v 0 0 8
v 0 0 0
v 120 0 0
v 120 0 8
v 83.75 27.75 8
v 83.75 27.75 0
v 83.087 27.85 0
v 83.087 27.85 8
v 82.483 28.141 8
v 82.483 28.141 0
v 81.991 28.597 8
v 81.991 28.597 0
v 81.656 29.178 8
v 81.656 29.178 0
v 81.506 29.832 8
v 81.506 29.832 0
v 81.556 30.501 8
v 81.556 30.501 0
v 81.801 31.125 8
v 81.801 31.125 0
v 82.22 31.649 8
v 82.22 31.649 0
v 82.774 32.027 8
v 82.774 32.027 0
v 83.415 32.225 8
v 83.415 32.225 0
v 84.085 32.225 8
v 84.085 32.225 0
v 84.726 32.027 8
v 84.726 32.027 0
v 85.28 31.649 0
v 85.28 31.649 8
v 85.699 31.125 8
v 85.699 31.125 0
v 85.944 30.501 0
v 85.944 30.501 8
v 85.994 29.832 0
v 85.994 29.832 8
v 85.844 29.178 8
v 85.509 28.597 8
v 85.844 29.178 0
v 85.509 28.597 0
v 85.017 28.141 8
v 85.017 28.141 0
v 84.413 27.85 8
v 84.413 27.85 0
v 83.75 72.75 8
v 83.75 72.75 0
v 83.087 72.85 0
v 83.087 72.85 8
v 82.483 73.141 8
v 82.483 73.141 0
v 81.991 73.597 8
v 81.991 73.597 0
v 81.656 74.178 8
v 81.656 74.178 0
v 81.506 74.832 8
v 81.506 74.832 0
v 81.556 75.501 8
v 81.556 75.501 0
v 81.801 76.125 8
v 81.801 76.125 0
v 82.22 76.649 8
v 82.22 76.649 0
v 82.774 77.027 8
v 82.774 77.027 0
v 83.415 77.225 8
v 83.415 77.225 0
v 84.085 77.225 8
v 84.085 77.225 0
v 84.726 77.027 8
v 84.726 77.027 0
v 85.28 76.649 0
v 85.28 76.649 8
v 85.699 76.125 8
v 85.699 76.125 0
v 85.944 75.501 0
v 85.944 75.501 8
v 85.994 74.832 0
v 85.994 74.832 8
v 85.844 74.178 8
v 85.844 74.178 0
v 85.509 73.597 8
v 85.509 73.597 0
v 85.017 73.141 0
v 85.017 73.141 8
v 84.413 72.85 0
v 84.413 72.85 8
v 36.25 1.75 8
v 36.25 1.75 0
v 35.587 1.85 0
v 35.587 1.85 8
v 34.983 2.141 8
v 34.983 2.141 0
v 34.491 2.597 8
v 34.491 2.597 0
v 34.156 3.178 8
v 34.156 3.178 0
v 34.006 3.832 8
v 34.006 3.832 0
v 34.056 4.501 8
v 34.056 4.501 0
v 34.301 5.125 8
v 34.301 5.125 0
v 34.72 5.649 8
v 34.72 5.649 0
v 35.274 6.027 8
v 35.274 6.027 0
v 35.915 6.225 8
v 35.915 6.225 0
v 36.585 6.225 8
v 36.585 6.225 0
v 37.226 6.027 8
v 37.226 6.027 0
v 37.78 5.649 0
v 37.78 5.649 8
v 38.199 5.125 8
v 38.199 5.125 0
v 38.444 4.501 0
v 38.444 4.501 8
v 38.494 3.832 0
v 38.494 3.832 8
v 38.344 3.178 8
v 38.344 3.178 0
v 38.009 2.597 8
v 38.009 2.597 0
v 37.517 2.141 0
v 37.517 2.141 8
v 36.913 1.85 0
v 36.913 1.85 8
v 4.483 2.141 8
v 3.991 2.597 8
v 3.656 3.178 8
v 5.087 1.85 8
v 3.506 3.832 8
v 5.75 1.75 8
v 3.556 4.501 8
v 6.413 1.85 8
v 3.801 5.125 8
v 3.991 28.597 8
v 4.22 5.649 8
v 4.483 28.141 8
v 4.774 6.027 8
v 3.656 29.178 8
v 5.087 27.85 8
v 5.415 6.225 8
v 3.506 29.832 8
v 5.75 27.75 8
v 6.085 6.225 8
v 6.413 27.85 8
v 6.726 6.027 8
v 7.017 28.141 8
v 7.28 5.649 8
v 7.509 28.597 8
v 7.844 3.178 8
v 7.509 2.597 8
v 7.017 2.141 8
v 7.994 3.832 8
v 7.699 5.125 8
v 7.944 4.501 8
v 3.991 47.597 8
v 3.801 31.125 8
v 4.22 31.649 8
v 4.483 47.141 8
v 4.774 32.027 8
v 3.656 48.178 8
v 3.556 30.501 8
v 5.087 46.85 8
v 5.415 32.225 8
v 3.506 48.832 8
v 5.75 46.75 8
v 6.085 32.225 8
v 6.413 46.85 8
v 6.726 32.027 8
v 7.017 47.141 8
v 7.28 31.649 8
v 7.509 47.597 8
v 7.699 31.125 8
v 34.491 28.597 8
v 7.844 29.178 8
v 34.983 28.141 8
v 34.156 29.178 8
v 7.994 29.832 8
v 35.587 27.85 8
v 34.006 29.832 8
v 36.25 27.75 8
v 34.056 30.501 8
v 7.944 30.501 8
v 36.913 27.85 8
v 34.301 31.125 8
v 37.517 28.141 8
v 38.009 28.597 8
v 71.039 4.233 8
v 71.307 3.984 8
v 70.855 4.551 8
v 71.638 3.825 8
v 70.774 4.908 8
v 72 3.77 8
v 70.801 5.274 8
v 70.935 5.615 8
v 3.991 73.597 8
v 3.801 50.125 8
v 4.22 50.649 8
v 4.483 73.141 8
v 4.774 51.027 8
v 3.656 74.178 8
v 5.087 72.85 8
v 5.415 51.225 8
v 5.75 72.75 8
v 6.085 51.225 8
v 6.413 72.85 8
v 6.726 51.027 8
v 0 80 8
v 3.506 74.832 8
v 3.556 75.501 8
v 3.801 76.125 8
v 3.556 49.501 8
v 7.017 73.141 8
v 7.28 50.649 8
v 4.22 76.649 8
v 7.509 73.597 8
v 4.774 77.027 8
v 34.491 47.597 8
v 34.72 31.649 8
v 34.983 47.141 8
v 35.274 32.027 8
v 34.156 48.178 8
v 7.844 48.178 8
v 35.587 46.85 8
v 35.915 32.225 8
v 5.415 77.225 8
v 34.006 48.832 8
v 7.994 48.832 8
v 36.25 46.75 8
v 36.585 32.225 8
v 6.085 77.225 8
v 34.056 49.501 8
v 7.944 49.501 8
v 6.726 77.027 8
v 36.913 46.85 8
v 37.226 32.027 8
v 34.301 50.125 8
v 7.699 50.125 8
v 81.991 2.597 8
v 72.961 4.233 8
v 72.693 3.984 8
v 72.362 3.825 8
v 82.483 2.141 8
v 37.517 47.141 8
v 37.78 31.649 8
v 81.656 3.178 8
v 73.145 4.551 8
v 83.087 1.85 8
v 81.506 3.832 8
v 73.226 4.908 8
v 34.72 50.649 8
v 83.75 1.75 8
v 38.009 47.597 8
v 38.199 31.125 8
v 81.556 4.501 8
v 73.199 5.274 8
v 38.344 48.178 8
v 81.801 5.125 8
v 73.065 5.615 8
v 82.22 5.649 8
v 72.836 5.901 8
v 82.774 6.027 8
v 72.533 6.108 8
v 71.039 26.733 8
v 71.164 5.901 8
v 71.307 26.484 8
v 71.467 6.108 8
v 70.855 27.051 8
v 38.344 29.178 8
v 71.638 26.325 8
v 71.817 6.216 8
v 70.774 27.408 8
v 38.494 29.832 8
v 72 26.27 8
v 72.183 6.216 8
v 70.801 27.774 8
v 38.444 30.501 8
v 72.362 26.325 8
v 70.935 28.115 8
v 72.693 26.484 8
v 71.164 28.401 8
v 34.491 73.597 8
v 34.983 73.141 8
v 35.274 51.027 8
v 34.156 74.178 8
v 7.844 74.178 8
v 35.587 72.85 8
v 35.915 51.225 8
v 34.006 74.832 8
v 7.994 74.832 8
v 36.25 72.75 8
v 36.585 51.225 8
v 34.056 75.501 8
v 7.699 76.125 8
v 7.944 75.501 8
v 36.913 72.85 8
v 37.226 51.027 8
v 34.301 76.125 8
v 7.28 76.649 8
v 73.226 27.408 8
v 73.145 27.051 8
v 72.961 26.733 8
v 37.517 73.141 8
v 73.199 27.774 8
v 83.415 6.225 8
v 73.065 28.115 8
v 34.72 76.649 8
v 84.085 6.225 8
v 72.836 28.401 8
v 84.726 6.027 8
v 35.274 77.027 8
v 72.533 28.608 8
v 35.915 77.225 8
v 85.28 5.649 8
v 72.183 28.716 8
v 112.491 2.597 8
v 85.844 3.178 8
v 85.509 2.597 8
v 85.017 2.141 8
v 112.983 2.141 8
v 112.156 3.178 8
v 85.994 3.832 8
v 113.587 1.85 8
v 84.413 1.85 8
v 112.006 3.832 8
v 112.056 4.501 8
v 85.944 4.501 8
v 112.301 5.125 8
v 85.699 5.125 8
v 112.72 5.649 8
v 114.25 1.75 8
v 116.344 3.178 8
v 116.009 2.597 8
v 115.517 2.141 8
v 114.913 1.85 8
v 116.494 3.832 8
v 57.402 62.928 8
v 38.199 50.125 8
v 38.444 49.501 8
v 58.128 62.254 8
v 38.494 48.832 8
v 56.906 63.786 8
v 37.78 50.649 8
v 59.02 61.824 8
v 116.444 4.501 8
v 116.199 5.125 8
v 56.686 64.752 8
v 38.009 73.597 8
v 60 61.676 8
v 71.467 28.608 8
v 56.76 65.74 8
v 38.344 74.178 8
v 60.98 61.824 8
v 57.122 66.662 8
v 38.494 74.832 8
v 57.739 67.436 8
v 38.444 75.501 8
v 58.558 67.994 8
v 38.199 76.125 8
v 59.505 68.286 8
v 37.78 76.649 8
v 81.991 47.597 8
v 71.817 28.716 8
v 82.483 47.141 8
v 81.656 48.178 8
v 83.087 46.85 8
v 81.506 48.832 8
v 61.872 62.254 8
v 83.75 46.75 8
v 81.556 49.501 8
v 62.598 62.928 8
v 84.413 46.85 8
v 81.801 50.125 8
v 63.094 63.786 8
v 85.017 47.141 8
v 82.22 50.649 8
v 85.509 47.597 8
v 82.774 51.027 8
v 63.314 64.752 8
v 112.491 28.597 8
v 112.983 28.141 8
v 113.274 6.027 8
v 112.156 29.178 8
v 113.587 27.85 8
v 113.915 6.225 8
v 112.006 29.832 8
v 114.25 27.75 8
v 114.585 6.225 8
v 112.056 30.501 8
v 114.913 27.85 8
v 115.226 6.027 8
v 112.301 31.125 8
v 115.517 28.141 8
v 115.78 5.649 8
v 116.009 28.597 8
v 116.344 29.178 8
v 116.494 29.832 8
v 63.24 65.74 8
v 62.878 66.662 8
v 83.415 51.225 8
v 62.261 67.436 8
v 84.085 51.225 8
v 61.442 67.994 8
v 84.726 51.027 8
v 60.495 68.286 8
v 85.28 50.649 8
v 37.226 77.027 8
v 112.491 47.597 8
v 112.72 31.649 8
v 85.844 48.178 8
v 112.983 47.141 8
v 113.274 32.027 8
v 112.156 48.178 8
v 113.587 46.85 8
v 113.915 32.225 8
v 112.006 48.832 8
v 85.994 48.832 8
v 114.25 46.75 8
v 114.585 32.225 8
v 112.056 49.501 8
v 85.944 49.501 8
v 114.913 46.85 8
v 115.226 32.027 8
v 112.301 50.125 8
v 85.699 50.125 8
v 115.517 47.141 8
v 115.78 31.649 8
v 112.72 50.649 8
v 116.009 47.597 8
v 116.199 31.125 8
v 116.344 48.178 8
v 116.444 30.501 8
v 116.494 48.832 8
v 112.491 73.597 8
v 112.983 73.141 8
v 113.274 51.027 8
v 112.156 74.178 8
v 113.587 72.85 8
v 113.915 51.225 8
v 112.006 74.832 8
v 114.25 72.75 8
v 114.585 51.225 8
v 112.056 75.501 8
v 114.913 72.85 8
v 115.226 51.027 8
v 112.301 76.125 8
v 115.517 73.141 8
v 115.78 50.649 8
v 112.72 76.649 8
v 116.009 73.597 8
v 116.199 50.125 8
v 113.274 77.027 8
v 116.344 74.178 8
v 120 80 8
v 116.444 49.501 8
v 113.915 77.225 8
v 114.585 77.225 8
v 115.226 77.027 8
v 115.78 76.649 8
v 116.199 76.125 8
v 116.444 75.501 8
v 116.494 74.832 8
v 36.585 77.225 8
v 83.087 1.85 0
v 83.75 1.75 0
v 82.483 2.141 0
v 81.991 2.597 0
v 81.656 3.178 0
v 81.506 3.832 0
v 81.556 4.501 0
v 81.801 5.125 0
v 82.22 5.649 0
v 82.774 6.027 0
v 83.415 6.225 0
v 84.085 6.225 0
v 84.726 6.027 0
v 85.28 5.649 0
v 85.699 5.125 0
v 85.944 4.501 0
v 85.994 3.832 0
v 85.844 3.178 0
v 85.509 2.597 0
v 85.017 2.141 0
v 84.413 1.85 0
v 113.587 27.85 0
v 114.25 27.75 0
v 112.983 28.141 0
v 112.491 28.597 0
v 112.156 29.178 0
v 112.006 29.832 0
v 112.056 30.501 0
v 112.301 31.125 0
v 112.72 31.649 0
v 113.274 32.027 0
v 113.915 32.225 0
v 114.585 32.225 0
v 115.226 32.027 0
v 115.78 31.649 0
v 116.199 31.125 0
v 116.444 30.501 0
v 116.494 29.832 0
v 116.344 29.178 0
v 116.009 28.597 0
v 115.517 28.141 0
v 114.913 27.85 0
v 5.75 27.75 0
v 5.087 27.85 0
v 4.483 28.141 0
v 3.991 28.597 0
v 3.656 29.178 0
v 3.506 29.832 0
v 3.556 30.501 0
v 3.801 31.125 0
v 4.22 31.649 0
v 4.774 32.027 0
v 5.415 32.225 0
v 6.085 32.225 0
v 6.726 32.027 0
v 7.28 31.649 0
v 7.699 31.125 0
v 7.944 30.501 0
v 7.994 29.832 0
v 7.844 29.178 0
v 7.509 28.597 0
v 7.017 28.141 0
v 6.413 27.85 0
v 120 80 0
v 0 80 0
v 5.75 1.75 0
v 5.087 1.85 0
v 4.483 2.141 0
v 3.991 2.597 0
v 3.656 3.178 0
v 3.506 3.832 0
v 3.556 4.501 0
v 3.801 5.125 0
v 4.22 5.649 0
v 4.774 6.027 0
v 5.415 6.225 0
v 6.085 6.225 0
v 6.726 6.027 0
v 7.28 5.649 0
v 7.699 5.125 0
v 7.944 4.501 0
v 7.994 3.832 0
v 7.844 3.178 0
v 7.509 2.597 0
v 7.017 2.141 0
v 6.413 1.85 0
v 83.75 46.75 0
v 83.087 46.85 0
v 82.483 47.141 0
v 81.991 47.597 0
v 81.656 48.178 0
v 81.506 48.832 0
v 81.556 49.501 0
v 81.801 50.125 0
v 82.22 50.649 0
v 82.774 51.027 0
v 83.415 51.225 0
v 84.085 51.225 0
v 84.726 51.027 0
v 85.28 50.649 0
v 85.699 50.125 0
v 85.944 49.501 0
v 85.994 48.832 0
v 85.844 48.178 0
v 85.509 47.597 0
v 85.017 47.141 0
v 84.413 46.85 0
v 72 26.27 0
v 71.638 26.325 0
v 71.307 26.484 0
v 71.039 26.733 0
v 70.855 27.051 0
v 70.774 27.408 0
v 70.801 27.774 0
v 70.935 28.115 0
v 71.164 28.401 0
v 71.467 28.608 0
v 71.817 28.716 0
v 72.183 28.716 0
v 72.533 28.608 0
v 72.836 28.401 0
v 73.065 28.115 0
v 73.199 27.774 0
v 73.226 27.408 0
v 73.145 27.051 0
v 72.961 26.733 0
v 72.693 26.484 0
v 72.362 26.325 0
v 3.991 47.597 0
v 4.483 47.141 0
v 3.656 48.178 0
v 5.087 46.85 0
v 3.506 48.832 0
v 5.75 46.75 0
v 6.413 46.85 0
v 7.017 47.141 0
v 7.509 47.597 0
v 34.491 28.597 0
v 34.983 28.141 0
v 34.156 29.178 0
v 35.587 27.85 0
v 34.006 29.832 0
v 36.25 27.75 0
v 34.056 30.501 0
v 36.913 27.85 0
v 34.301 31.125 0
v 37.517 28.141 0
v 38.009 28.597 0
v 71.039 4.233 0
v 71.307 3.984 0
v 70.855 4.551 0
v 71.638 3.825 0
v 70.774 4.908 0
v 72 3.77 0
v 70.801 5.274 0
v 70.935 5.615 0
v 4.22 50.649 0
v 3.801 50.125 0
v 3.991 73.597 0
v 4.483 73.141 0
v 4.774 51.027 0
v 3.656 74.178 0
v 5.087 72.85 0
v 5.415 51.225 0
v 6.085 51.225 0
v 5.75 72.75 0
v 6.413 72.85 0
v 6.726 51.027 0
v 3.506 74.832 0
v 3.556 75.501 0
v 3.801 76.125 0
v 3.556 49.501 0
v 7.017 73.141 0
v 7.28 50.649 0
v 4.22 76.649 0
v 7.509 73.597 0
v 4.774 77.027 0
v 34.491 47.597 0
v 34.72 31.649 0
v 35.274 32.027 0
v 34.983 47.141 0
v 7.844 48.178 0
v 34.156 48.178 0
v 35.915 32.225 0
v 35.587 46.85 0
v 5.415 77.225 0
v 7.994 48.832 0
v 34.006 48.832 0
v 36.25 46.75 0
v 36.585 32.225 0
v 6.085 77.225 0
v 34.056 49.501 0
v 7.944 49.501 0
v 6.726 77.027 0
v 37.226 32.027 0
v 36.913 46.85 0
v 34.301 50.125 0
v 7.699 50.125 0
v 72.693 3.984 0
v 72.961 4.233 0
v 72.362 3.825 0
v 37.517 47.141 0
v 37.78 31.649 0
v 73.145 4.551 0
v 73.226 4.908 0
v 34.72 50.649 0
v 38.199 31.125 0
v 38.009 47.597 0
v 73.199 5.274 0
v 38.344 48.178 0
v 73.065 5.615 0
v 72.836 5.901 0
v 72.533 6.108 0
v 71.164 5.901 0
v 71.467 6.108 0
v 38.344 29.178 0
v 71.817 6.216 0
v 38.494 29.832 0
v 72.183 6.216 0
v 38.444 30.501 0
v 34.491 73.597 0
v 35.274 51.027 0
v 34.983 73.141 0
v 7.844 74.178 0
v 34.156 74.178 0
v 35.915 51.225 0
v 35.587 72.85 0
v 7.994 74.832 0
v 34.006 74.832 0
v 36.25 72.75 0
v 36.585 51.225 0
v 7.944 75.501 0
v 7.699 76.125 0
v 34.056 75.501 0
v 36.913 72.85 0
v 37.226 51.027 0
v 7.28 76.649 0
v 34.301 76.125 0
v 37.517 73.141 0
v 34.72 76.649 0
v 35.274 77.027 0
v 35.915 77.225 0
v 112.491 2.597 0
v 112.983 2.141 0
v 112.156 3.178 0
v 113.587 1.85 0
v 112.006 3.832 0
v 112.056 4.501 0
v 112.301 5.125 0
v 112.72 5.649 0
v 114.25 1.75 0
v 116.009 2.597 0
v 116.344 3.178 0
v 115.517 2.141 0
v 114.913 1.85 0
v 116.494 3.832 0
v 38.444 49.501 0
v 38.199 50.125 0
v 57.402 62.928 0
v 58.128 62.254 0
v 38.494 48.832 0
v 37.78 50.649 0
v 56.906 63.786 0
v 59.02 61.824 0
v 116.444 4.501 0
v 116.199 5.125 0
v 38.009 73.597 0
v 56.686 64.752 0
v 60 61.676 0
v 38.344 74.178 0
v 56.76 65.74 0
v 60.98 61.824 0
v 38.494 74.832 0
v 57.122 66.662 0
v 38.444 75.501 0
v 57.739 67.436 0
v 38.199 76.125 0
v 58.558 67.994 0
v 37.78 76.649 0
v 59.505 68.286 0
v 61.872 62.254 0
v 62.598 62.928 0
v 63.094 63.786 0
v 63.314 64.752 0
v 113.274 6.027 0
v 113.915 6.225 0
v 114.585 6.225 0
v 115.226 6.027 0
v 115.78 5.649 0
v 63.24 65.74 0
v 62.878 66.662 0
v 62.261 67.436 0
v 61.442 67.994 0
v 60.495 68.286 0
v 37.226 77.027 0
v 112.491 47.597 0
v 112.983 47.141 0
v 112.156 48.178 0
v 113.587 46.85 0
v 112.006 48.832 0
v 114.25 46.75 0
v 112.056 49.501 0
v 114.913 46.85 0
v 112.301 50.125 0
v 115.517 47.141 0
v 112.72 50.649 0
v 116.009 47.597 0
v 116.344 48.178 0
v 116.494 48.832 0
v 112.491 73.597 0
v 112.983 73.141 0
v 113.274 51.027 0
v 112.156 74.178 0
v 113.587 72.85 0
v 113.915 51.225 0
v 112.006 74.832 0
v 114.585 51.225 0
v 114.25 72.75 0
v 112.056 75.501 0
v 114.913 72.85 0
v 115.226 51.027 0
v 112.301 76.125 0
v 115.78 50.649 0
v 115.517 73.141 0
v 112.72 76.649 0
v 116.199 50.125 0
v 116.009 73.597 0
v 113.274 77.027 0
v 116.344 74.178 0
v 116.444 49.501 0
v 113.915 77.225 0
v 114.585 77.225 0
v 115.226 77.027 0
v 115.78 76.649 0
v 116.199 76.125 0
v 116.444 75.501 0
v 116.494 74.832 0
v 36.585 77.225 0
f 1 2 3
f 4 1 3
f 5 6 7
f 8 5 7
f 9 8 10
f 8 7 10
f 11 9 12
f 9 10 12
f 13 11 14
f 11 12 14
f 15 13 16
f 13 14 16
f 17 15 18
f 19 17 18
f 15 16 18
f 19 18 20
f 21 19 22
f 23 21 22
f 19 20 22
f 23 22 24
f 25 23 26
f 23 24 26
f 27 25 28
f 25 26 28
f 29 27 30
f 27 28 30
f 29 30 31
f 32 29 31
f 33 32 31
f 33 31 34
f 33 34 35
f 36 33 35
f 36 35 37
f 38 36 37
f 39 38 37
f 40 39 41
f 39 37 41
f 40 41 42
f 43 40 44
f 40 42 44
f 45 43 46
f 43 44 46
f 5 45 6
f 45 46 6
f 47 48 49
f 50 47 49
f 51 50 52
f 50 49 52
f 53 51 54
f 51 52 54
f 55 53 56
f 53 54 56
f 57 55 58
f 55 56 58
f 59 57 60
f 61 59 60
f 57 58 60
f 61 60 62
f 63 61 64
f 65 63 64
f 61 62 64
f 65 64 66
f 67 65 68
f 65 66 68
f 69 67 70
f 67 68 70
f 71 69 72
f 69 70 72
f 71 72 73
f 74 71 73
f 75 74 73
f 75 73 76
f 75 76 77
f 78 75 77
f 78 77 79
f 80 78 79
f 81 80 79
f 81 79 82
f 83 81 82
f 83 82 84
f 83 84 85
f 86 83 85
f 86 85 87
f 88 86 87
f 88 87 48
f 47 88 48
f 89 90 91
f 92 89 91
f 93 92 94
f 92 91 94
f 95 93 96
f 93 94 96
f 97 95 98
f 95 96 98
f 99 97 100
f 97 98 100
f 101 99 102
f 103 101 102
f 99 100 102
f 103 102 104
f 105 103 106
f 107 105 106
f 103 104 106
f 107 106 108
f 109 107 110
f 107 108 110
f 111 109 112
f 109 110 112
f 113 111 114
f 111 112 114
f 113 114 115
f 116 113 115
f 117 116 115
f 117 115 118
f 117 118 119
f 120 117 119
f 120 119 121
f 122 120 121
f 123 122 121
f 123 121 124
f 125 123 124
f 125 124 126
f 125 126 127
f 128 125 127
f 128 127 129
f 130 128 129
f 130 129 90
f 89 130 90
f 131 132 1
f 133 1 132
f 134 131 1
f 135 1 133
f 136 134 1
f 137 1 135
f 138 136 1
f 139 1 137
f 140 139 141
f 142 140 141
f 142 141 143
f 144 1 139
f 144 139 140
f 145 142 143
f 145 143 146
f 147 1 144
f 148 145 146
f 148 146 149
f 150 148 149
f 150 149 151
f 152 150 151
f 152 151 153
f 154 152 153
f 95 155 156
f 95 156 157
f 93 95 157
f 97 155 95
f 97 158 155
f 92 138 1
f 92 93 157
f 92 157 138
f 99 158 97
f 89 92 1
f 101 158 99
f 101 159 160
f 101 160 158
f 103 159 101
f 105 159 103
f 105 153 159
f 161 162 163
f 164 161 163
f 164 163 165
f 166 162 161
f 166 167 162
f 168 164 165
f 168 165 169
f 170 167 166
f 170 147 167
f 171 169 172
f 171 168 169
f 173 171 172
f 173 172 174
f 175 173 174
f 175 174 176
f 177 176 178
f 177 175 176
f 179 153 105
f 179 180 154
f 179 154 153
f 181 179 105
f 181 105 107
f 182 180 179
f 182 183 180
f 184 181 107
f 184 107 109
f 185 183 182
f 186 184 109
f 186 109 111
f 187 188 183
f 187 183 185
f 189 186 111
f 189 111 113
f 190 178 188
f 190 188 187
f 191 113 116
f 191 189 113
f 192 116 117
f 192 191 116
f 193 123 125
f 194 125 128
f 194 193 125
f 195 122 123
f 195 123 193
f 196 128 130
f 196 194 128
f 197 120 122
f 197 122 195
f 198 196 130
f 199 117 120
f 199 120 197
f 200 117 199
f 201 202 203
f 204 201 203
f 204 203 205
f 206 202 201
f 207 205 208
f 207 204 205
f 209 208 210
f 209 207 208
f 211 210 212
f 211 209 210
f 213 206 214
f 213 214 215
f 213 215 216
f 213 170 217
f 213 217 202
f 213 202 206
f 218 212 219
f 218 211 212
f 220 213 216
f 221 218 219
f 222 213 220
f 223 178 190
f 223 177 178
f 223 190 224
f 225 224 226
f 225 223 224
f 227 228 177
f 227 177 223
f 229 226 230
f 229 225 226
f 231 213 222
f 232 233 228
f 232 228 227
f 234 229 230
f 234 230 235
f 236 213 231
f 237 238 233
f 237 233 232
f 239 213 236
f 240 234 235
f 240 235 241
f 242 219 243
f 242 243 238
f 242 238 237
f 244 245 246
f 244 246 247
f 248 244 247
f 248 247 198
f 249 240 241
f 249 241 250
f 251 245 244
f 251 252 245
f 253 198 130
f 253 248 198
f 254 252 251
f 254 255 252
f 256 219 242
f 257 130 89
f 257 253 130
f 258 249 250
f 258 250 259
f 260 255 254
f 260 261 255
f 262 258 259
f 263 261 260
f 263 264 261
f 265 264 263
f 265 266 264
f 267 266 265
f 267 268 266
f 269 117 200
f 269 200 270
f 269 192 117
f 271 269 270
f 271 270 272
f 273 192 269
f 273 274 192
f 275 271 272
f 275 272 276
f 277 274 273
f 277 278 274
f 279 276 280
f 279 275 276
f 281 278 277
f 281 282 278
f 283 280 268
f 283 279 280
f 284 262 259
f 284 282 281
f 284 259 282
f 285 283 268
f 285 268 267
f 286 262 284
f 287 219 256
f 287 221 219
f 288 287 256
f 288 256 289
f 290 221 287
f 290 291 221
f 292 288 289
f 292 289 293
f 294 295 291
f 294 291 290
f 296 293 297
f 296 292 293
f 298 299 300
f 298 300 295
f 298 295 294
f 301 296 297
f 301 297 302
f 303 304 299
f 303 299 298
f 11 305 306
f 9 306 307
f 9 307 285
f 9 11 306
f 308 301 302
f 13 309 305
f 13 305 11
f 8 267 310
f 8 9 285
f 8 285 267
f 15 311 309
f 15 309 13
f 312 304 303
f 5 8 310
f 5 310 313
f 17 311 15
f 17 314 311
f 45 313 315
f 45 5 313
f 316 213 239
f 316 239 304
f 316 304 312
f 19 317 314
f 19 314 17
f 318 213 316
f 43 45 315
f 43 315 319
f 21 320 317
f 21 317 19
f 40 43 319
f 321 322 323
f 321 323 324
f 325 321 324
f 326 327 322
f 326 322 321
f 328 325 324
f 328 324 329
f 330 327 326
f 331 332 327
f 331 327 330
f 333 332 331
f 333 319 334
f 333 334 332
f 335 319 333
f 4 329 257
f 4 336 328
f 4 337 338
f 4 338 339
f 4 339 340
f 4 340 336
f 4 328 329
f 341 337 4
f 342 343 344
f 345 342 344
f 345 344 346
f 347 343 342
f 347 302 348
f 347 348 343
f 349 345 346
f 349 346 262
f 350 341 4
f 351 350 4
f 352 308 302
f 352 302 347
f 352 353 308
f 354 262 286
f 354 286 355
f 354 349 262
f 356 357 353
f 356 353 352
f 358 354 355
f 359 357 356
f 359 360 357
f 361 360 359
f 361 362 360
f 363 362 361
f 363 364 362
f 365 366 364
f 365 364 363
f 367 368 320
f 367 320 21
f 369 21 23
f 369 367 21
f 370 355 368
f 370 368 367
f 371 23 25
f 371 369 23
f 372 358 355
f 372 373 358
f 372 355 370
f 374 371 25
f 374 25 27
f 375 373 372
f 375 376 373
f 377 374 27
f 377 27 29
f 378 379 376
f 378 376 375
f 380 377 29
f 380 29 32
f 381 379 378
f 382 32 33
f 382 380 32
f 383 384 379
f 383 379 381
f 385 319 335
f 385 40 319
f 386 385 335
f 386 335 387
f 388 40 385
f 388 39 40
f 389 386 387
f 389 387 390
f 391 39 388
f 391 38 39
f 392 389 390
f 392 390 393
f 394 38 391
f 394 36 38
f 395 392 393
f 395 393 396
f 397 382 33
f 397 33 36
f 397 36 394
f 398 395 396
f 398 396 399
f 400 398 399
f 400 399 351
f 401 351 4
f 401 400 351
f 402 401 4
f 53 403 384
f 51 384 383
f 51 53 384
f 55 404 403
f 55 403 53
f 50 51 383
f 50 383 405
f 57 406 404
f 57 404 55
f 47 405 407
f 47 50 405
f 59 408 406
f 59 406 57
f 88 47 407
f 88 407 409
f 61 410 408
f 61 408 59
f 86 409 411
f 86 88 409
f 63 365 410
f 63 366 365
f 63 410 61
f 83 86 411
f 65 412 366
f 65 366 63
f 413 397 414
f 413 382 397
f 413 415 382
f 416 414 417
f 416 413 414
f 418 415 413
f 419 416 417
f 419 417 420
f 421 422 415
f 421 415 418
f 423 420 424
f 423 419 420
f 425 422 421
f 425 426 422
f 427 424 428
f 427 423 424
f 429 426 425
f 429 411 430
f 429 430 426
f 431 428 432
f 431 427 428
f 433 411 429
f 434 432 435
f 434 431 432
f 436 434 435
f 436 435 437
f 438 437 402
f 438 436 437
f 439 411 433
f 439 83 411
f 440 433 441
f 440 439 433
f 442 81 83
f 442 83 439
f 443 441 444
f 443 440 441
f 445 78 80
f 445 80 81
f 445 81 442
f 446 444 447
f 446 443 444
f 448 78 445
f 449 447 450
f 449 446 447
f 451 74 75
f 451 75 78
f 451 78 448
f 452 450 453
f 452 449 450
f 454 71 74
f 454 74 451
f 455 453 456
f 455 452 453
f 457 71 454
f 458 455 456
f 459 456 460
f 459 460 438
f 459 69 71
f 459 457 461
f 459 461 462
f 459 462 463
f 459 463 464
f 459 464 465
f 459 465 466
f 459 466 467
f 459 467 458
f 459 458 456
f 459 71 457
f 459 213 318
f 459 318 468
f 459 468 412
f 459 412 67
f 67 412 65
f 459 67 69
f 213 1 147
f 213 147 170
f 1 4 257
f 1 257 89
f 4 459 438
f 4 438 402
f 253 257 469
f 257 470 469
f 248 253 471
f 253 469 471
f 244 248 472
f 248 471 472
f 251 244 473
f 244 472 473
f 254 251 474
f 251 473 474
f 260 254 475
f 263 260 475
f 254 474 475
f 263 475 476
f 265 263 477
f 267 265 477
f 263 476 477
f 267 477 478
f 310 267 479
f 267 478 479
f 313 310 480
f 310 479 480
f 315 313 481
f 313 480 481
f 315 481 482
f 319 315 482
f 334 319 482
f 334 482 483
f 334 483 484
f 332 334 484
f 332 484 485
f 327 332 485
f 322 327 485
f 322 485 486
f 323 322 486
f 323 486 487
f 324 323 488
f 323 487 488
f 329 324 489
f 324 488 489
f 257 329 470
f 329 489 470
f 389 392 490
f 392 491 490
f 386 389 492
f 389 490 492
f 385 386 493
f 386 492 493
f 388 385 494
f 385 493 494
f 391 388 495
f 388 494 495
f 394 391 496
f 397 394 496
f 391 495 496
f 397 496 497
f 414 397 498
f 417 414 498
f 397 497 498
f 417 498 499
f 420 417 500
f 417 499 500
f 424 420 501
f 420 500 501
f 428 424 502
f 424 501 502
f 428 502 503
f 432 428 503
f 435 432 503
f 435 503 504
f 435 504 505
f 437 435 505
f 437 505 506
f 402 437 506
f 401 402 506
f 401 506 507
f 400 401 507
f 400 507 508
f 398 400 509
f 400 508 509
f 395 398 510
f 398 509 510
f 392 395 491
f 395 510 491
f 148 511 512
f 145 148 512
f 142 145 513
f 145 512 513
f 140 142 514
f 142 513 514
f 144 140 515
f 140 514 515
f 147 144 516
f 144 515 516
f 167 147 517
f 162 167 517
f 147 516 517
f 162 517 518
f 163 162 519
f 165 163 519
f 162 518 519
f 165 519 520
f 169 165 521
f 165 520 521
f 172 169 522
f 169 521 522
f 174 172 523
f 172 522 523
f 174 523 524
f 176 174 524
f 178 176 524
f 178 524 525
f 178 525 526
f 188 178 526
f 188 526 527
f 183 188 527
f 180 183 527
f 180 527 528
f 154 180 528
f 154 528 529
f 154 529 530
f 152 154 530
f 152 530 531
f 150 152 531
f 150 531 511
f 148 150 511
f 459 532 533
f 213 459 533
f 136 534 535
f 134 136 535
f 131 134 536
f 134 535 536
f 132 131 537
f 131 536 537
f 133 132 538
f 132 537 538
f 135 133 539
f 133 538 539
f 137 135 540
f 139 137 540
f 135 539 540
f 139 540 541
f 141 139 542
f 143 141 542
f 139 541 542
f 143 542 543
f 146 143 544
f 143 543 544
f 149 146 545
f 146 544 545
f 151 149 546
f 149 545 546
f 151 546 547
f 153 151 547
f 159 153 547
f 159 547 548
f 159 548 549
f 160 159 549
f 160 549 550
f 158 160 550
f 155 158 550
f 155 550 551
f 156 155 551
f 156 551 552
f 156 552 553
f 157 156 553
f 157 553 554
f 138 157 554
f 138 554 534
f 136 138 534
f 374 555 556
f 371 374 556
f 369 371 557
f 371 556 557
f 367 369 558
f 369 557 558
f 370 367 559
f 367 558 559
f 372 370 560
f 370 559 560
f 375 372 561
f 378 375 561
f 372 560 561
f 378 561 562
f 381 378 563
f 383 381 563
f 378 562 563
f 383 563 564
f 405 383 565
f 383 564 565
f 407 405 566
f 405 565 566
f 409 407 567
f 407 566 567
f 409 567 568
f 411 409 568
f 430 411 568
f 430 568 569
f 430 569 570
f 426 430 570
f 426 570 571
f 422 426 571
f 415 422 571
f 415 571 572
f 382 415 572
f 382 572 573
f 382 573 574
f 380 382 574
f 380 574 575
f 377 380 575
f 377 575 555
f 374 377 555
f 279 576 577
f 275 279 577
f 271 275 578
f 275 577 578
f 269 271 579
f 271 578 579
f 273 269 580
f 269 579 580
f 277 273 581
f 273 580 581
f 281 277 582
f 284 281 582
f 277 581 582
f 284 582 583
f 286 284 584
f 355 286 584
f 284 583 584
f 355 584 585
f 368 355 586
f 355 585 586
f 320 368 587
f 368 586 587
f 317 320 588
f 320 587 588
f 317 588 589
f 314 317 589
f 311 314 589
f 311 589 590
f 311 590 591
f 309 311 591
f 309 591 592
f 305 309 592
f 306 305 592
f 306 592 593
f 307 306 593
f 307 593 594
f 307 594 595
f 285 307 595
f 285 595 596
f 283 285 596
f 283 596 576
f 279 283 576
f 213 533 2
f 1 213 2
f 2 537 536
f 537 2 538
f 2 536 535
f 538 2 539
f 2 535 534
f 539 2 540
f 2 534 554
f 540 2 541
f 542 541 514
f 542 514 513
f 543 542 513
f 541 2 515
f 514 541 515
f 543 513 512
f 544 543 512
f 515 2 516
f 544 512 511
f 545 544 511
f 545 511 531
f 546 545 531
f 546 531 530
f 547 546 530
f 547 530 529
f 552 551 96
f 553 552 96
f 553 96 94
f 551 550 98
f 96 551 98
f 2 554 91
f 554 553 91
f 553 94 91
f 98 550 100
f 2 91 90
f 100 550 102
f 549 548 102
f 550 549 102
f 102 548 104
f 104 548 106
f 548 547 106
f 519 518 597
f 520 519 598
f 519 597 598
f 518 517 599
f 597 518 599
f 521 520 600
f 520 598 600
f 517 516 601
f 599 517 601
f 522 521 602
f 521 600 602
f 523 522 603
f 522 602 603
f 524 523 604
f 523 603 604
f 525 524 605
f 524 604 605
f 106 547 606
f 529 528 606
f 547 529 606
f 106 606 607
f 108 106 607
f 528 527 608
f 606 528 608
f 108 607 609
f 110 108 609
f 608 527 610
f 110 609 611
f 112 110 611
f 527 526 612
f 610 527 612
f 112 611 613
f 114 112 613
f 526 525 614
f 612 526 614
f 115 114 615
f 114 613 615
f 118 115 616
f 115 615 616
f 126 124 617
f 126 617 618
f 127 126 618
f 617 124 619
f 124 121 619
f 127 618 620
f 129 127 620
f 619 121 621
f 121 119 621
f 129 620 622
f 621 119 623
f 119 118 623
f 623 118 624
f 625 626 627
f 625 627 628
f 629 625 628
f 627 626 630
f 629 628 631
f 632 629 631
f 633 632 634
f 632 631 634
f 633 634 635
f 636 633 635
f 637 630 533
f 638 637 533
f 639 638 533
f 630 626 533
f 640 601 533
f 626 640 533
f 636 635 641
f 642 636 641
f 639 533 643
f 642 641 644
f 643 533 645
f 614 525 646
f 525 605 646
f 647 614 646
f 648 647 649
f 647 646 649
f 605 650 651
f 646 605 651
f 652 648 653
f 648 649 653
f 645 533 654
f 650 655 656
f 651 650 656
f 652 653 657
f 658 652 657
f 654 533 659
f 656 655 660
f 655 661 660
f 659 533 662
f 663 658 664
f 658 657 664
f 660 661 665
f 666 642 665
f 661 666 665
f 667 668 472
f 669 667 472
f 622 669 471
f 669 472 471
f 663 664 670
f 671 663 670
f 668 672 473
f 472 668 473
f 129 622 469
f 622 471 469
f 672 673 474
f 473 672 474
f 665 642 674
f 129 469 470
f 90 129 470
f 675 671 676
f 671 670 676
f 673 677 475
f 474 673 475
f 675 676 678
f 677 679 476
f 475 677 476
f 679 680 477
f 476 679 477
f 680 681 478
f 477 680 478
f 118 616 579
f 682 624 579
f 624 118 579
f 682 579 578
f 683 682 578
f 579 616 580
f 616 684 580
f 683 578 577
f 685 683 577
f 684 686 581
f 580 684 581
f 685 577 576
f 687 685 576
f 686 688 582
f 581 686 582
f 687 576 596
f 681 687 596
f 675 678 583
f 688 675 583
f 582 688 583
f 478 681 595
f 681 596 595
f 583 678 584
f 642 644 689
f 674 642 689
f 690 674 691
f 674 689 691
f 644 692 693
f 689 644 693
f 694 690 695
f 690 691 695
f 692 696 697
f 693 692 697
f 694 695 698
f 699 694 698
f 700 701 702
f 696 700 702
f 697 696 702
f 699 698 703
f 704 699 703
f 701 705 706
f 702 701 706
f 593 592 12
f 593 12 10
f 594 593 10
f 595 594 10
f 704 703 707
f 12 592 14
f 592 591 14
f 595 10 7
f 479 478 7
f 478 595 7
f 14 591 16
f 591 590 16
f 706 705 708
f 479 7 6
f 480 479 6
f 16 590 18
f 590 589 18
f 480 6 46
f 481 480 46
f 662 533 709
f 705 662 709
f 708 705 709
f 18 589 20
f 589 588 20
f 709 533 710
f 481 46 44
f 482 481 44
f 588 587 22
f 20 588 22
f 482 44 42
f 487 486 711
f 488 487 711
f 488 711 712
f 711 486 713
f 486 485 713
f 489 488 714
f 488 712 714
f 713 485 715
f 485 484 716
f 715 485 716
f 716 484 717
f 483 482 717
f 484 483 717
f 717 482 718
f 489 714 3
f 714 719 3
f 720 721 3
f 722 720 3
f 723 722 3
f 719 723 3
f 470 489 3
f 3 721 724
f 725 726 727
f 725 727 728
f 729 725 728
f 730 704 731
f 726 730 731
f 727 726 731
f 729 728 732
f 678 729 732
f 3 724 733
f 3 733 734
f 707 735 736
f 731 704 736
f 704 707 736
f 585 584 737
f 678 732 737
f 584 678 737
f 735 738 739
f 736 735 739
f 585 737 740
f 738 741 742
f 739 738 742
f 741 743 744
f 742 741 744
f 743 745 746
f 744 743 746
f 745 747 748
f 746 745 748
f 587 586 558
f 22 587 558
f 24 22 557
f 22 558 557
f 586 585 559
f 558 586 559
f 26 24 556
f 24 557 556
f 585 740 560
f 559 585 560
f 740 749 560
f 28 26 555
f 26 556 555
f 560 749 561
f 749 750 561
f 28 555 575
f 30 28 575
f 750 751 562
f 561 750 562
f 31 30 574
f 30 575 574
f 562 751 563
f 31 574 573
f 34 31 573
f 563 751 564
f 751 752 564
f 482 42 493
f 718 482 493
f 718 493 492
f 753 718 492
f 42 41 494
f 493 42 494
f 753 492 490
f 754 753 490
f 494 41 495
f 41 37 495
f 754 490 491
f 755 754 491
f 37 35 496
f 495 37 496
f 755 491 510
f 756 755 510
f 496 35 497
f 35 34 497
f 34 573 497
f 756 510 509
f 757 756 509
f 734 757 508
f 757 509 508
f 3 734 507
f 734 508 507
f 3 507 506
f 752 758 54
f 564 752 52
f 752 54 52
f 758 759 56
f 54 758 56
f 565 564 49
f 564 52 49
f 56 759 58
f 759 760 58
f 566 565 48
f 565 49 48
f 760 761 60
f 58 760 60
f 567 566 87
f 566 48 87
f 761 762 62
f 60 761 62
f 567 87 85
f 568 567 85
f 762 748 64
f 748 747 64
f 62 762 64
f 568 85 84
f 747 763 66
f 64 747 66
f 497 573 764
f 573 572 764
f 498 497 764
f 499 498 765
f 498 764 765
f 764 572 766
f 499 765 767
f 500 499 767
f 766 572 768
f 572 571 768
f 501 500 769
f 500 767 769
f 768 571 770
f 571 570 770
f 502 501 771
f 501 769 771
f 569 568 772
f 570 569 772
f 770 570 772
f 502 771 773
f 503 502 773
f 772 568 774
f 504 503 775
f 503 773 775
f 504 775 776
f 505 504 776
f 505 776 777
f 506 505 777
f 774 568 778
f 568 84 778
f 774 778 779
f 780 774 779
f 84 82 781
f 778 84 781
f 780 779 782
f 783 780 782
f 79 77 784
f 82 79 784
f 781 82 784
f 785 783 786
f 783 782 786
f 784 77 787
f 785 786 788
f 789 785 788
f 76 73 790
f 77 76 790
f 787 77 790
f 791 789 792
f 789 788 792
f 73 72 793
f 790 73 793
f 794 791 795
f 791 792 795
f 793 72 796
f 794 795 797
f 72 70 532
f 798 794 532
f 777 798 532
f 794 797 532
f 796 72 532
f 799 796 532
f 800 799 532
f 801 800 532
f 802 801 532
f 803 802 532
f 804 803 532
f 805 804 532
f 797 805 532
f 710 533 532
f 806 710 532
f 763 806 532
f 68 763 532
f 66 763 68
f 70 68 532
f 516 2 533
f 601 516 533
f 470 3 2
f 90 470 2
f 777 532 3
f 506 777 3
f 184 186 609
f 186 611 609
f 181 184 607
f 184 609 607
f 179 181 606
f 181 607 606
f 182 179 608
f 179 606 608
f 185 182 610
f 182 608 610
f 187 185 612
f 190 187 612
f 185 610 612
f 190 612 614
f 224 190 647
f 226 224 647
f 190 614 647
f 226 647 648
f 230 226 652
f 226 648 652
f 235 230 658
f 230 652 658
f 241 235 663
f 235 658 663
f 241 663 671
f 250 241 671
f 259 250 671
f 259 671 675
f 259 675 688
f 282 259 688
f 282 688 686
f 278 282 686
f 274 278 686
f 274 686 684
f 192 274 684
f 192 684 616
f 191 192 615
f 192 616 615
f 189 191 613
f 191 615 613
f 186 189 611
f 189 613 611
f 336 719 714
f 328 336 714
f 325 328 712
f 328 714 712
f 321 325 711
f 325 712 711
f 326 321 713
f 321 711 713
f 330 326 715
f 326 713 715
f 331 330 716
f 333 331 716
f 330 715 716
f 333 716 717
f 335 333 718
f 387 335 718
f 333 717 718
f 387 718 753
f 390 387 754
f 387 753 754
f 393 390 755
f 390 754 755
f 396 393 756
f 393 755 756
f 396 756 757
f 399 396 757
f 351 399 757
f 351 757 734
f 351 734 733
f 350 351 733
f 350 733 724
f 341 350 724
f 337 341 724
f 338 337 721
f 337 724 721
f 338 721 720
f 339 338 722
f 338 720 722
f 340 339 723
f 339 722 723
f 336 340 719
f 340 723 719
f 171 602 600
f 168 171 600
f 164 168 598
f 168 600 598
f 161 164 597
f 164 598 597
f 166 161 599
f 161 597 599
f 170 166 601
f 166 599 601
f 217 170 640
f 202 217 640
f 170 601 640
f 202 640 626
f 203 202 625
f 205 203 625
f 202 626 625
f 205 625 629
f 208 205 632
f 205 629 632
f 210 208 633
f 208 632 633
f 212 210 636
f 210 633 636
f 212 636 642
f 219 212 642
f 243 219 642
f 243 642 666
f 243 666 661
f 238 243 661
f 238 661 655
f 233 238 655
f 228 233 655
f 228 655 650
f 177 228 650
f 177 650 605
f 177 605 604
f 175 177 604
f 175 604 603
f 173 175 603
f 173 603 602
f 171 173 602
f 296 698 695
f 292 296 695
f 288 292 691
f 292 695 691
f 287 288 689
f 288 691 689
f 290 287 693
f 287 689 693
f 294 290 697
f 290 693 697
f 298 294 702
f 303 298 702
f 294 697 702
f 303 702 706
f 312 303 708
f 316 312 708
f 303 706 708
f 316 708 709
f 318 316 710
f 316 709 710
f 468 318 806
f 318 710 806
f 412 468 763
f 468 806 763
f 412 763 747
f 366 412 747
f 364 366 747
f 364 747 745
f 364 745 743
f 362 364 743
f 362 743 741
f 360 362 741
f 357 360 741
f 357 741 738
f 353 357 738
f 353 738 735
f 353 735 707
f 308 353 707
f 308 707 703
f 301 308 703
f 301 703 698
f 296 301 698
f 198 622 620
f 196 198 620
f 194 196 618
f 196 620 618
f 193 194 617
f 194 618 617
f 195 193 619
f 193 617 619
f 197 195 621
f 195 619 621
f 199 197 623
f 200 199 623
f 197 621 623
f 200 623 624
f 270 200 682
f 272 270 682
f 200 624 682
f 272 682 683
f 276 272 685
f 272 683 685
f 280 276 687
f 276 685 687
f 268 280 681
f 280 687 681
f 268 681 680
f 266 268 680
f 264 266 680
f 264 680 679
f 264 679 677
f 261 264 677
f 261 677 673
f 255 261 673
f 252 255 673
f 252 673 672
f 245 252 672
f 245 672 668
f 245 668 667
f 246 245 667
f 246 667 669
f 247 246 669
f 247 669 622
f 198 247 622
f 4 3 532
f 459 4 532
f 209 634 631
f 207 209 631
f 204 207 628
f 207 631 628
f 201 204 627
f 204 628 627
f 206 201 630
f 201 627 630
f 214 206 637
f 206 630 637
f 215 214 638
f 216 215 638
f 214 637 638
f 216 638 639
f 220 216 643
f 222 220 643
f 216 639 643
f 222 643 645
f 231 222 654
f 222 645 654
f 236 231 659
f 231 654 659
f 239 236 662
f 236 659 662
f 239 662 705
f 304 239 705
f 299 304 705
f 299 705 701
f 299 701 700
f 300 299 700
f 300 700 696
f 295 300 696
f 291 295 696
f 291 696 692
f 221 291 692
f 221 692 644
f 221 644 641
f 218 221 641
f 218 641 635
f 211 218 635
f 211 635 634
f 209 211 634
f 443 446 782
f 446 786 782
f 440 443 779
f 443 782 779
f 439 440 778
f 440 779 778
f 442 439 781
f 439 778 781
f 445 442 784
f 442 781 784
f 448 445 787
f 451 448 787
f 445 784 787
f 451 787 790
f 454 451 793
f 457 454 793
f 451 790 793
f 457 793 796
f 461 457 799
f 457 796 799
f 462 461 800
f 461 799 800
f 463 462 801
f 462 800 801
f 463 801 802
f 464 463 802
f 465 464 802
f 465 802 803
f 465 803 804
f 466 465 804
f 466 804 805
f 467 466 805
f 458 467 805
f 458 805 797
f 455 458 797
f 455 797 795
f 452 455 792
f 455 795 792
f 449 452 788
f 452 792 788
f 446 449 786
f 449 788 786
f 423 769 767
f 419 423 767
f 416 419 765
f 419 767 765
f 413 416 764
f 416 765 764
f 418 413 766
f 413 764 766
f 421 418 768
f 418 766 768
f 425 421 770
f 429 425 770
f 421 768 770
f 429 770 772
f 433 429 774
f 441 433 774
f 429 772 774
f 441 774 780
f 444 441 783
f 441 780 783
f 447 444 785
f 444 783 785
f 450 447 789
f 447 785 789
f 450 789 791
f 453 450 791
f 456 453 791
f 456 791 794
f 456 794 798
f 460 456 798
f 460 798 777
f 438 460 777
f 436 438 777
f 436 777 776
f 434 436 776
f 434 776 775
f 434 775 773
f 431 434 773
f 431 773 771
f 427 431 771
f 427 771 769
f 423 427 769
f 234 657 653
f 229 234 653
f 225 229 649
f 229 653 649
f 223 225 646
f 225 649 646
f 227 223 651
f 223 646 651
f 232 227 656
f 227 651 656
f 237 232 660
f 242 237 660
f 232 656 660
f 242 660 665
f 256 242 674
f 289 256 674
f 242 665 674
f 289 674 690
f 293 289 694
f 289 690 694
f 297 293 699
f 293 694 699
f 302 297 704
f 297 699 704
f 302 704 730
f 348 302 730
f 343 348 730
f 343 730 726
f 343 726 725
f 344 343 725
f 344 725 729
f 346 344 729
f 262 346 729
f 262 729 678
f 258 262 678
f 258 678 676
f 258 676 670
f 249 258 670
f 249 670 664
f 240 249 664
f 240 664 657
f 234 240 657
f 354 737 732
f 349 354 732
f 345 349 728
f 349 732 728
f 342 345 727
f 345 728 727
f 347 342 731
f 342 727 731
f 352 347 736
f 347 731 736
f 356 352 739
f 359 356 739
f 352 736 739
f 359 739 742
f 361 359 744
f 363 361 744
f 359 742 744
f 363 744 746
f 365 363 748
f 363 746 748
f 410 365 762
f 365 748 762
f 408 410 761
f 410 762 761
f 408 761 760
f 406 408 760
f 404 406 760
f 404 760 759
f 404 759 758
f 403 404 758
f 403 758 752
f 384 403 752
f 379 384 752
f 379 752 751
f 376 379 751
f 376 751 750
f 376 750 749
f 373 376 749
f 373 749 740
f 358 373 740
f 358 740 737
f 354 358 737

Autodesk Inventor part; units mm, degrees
ref_plane "YZ Plane" through (0, 0, 0) normal (1, 0, 0) x (0, 1, 0)
ref_plane "XZ Plane" through (0, 0, 0) normal (0, 1, 0) x (-1, 0, 0)
ref_plane "XY Plane" through (0, 0, 0) normal (0, 0, 1) x (1, 0, 0)
sketch "Sketch1" plane through (0, 0, 0) normal (0, 0, 1) x (1, 0, 0)
  line L0 (0, 0) -> (120, 0)
  line L1 (120, 0) -> (120, 80)
  line L2 (120, 80) -> (0, 80)
  line L3 (0, 80) -> (0, 0)
  dimension "width" = 120
  dimension "height" = 80
extrude "Extrusion1" add sketch "Sketch1" along normal blind 8
hole "Hole1" at (36.25, 75, 8) direction (0, 0, -1) diameter 4.5 end through all
pattern_linear "Rectangular Pattern1" count 2 spacing 30.5 along (-1, 0, 0) count 2 spacing 26 along (0, -1, 0) of "Hole1"
hole "Hole2" at (83.75, 75, 8) direction (0, 0, -1) diameter 4.5 end through all
pattern_linear "Rectangular Pattern2" count 2 spacing 30.5 along (1, 0, 0) count 2 spacing 26 along (0, -1, 0) of "Hole2"
pattern_linear "Rectangular Pattern3" count 2 spacing 45 along (0, -1, 0) of "Hole1", "Rectangular Pattern1", "Hole2", "Rectangular Pattern2"
hole "Hole3" at (60, 65, 8) direction (0, 0, -1) diameter 6.647 end through all thread size "M8x1.25" class "6H" standard "ANSI Metric M Profile"
hole "Hole4" at (72, 5, 8) direction (0, 0, -1) diameter 2.459 end through all thread size "M3x0.5" class "6H" standard "ANSI Metric M Profile"
hole "Hole5" at (72, 27.5, 8) direction (0, 0, -1) diameter 2.459 end through all thread size "M3x0.5" class "6H" standard "ANSI Metric M Profile"
equation "\"d37\" = 0.5 * width"
properties part number "mobile plate"
